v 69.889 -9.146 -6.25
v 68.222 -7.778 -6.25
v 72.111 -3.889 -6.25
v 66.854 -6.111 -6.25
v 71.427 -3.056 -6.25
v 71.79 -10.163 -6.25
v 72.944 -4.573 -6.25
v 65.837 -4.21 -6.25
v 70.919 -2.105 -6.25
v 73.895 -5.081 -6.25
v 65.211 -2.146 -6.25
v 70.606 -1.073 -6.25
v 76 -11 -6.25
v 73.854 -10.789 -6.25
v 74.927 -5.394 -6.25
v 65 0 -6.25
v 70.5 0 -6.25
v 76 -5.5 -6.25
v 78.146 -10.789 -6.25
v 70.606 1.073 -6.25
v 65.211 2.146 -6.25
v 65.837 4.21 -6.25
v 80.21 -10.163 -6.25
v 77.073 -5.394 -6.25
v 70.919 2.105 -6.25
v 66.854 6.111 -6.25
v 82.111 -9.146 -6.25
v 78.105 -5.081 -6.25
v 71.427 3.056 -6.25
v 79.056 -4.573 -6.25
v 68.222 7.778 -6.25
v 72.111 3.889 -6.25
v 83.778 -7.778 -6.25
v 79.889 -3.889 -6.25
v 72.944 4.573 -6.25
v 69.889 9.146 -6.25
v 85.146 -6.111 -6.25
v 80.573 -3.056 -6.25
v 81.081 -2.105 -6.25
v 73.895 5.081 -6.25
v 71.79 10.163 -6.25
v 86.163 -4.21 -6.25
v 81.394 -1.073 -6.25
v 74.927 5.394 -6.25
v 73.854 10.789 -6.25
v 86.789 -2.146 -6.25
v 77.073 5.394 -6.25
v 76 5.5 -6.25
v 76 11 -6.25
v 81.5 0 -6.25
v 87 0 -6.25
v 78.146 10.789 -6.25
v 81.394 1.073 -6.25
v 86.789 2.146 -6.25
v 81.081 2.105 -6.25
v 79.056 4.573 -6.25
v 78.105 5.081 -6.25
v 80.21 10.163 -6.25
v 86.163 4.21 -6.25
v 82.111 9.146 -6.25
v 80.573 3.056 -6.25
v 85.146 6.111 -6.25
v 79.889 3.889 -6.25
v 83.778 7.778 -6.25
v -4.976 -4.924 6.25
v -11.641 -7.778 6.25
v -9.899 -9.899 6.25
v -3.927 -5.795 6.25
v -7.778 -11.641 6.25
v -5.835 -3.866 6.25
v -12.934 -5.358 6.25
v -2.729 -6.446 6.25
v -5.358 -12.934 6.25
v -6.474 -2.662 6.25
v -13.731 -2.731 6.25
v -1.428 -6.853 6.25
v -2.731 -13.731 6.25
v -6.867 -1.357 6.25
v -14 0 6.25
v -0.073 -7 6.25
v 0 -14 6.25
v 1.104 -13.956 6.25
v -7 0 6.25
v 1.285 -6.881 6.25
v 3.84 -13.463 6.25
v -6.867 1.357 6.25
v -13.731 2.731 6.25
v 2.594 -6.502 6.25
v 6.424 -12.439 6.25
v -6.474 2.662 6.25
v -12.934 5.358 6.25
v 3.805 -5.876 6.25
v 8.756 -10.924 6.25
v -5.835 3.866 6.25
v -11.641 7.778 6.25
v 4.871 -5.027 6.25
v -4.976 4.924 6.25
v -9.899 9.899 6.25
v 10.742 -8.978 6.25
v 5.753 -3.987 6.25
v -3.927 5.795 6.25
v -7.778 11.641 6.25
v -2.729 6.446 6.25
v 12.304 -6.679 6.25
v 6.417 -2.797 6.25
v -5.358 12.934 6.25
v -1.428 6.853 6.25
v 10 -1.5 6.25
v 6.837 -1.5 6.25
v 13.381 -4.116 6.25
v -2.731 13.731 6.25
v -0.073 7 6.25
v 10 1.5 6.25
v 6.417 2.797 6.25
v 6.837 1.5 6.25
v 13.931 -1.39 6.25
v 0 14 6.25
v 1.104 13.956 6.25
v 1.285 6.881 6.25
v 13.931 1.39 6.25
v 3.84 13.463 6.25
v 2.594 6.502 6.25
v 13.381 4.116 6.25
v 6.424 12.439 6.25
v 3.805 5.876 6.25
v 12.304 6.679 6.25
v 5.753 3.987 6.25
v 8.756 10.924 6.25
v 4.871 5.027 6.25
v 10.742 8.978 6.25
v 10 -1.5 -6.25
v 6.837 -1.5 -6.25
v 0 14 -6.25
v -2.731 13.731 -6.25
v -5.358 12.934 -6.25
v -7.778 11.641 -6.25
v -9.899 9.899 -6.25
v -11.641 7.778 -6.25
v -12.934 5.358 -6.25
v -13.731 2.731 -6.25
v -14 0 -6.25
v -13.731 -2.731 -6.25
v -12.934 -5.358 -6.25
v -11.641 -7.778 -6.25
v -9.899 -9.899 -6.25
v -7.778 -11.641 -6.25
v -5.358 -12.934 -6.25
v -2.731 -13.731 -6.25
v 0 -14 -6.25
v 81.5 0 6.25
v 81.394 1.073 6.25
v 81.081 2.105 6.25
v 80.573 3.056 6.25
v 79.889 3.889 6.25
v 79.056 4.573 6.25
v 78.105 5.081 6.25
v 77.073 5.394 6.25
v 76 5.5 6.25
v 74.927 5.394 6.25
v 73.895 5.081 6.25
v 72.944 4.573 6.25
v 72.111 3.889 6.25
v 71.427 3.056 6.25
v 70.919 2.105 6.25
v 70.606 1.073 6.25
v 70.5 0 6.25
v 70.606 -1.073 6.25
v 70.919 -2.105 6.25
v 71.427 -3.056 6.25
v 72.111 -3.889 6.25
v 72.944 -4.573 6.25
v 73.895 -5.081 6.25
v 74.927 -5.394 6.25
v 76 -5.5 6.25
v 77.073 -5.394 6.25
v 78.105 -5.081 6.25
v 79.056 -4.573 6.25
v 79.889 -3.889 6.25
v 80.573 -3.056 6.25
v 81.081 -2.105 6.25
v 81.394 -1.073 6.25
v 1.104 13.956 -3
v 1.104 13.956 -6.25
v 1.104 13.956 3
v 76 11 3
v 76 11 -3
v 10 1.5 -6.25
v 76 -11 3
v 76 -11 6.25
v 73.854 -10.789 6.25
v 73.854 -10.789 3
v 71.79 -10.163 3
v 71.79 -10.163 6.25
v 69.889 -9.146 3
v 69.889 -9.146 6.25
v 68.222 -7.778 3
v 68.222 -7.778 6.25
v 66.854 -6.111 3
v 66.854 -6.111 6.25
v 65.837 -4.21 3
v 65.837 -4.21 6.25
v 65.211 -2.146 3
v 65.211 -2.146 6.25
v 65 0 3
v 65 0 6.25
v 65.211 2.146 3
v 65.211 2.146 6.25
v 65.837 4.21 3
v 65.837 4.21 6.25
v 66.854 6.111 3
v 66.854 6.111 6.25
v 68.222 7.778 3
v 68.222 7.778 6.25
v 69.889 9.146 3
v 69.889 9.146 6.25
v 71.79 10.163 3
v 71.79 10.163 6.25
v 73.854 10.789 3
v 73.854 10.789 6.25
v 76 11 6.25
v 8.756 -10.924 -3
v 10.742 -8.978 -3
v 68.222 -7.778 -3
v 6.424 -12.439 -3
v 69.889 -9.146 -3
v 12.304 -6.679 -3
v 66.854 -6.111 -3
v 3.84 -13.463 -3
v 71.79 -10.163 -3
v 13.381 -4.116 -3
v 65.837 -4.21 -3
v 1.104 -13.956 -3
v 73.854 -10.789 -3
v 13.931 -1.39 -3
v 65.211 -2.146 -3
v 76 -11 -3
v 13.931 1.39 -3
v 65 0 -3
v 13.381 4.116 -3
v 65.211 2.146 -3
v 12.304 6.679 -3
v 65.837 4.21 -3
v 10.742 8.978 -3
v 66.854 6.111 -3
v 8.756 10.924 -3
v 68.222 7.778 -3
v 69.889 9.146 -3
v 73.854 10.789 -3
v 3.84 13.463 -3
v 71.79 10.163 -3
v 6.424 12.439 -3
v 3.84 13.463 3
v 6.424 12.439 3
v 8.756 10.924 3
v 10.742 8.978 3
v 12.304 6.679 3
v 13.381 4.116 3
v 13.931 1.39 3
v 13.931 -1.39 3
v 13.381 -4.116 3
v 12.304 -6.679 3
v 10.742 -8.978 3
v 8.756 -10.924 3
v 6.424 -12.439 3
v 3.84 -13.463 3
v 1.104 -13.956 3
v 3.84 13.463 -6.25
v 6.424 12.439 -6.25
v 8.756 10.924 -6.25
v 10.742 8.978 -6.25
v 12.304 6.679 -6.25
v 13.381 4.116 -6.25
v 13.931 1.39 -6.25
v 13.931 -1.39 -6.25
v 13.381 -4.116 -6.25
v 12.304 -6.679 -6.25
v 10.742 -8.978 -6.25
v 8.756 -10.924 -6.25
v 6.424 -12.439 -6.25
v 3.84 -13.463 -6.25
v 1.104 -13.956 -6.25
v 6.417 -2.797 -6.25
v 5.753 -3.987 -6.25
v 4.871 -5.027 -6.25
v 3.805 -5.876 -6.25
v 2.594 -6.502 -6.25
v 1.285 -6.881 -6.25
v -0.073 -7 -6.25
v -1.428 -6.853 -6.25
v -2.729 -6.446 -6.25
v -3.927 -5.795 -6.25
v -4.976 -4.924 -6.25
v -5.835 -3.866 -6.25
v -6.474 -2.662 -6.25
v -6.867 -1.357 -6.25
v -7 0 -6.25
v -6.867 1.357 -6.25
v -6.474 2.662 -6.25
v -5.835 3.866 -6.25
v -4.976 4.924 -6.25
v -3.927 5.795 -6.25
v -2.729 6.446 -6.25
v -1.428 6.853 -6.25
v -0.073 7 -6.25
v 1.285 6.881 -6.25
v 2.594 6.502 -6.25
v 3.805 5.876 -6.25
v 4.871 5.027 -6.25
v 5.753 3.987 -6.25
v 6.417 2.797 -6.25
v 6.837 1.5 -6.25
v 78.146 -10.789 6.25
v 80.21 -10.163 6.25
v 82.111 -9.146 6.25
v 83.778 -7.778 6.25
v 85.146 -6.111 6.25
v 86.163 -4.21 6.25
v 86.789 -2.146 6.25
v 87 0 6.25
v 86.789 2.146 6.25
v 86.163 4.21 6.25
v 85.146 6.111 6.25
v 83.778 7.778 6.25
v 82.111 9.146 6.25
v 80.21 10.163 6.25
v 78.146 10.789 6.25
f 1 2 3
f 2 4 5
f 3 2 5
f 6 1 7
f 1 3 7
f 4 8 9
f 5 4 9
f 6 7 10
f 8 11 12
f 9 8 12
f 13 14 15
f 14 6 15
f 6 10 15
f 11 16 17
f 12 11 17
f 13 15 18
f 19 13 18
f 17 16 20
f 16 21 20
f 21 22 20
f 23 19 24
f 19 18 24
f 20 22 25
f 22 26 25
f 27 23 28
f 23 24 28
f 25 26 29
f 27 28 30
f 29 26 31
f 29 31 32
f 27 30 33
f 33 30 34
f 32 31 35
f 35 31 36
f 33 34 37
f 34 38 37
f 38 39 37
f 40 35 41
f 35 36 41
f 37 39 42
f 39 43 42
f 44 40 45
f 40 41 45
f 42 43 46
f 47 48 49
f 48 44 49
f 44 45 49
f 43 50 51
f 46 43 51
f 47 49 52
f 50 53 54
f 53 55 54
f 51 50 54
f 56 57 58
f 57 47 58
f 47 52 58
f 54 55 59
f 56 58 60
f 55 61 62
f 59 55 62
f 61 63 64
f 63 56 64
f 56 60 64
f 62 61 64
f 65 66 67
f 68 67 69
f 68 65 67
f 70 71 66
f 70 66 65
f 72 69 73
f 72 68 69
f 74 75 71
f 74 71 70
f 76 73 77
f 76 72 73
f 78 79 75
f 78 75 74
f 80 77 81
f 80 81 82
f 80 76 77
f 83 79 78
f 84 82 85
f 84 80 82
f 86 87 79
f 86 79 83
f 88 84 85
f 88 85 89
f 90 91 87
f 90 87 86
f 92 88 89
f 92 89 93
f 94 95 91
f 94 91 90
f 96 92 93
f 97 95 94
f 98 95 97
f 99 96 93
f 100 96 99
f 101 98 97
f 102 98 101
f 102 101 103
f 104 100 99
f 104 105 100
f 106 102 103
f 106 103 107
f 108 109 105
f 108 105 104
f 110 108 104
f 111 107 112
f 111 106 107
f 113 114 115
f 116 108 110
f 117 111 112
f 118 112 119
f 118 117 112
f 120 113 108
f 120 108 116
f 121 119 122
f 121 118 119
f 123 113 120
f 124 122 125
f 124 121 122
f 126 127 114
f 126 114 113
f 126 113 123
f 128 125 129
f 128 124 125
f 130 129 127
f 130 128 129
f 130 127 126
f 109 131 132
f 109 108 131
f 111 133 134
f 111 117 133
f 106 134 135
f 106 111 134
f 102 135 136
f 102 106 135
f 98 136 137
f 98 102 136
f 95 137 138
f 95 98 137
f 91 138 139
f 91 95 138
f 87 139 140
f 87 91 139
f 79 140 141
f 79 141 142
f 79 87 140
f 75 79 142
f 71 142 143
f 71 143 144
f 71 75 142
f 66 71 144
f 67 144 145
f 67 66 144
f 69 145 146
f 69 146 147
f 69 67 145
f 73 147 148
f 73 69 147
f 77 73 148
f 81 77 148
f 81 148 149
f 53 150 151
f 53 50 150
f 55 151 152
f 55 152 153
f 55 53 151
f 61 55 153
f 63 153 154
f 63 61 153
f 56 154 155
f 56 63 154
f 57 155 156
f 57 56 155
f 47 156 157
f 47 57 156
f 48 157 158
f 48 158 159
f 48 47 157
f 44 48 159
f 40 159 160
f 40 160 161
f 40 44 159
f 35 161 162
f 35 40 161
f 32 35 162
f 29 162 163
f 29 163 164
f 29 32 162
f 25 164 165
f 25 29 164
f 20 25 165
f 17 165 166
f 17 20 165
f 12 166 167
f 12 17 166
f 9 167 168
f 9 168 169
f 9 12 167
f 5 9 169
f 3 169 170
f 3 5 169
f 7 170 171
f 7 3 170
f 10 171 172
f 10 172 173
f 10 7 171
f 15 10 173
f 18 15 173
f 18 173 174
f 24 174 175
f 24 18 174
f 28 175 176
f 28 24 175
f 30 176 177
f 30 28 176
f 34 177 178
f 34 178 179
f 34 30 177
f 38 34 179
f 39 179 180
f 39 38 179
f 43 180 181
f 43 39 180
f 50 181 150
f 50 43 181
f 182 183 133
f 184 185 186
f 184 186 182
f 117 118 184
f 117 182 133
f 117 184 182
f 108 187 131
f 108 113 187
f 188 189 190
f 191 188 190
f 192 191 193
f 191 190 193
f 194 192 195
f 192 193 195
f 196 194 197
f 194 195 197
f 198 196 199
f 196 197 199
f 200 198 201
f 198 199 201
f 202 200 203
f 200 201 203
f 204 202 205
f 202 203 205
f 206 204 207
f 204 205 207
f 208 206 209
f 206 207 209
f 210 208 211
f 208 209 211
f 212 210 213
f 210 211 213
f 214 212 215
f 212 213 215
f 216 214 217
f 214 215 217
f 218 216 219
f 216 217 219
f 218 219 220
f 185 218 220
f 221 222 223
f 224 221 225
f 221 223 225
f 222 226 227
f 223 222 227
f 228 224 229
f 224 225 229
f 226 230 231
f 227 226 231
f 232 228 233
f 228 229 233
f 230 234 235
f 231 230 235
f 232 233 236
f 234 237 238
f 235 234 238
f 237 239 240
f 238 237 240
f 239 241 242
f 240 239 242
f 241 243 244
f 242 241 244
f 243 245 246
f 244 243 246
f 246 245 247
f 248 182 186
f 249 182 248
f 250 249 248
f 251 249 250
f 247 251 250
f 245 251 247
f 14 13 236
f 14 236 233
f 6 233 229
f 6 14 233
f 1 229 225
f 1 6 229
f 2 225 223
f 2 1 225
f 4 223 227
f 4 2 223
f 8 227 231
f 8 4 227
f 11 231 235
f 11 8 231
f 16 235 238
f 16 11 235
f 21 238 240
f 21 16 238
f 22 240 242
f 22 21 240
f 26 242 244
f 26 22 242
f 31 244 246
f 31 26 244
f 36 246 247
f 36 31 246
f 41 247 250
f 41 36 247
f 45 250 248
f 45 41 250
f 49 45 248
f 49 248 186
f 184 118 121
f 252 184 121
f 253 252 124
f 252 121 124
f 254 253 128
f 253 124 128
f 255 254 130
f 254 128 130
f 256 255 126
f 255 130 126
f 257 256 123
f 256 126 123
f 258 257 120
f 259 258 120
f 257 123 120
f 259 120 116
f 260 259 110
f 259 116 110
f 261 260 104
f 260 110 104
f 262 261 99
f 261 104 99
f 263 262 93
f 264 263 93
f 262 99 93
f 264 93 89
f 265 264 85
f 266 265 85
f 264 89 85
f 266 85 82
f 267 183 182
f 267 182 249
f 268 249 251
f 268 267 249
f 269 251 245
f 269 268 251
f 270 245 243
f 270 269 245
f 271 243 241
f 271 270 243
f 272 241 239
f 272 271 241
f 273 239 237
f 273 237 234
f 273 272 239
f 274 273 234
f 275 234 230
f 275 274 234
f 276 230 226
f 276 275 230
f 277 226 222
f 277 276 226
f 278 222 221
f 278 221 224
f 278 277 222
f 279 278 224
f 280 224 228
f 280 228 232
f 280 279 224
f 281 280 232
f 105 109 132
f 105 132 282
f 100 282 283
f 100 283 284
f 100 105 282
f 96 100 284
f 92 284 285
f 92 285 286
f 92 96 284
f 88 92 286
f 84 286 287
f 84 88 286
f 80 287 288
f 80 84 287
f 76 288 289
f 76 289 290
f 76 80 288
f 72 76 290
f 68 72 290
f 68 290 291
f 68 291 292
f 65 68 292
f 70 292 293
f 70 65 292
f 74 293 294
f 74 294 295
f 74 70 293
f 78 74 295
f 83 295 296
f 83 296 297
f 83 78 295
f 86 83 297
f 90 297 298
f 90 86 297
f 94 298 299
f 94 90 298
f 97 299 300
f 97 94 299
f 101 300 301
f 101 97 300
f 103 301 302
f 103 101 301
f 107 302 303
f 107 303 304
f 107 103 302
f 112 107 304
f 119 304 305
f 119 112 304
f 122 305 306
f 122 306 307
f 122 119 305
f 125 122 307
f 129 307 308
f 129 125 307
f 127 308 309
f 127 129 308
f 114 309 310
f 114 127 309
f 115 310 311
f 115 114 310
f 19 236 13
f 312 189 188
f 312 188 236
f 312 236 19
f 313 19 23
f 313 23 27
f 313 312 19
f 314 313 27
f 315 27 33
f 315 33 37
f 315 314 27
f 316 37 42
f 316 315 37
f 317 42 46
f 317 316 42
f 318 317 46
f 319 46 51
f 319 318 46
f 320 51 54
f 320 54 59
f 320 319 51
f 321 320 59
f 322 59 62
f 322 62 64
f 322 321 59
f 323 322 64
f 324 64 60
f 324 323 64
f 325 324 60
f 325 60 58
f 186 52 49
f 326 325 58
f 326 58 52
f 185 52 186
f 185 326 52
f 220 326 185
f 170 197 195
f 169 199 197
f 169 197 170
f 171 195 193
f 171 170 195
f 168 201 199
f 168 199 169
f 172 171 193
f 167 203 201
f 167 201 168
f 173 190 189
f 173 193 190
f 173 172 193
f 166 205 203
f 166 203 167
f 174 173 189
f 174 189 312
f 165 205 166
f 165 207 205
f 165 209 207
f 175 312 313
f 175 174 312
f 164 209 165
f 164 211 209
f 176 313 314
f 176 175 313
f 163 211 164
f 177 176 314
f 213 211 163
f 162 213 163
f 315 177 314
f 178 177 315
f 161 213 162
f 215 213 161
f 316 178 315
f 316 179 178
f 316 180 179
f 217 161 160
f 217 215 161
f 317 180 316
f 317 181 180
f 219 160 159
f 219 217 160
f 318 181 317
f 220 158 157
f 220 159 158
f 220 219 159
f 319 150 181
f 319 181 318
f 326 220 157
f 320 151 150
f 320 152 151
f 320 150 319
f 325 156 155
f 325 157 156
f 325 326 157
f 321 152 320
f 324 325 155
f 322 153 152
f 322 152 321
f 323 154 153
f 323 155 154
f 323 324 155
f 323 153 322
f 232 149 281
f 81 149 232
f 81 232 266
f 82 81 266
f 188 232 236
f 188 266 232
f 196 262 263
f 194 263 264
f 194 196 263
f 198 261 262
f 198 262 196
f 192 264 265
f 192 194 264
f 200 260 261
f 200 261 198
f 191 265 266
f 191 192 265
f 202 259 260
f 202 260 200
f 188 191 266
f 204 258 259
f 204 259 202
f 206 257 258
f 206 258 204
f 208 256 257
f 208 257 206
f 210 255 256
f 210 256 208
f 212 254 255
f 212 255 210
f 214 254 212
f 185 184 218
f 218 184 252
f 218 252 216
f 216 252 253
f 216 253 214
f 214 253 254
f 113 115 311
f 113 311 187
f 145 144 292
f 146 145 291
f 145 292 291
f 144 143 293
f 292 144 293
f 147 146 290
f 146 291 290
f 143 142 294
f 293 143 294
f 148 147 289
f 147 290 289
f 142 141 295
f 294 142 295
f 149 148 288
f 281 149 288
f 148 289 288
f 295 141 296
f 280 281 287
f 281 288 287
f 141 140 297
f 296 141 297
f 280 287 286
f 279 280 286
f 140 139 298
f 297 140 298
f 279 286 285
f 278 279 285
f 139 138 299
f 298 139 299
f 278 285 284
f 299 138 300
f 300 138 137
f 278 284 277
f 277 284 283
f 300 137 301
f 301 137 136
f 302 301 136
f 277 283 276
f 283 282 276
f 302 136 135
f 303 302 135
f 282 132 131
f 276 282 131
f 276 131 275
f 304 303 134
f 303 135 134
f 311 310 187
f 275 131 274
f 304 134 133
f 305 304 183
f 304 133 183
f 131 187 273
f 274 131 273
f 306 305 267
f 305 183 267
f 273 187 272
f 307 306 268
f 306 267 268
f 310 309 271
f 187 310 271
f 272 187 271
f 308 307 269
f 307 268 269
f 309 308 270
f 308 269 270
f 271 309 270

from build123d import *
from build123d.topology import SkipClean

# Parameters (mm, degrees)
SKETCH4_R           = 5.5
BOSS_EXTRUDE3_DEPTH = 6.25
CUT_EXTRUDE1_DEPTH  = 3.25


with BuildPart() as part:
    # Sketch4 → Boss-Extrude3 (new, symmetric)
    with BuildSketch(Plane.XY):
        with BuildLine():
            ThreePointArc((0, 14), (-14, 0), (0, -14))
            Line((0, -14), (76, -11))
            ThreePointArc((76, -11), (87, 0), (76, 11))
            Line((76, 11), (0, 14))
        make_face()
        with BuildLine():
            ThreePointArc((6.837397166, -1.5), (-7, 0), (6.837397166, 1.5))
            Line((6.837397166, 1.5), (10, 1.5))
            Line((10, 1.5), (10, -1.5))
            Line((10, -1.5), (6.837397166, -1.5))
        make_face(mode=Mode.SUBTRACT)
        with Locations((76, 0)):
            Circle(SKETCH4_R, mode=Mode.SUBTRACT)
    extrude(amount=BOSS_EXTRUDE3_DEPTH, both=True)

    # Sketch5 → Cut-Extrude1 (cut)
    with SkipClean():  # the faces are left unmerged after this step: merging them gives an invalid solid
        with BuildSketch(Plane.XY.offset(6.25)):
            with BuildLine():
                Line((76, 11), (1.103543647, 13.956439067))
                ThreePointArc((1.103543647, 13.956439067), (14, 0), (1.103543647, -13.956439067))
                Line((1.103543647, -13.956439067), (76, -11))
                ThreePointArc((76, -11), (65, 0), (76, 11))
            make_face()
        cut_extrude1 = extrude(amount=-CUT_EXTRUDE1_DEPTH, mode=Mode.SUBTRACT)

    # Mirror1: Cut-Extrude1 across plane
    with SkipClean():  # the faces are left unmerged after this step: merging them gives an invalid solid
        add(cut_extrude1.mirror(Plane.XY), mode=Mode.SUBTRACT)


solid = part.part
